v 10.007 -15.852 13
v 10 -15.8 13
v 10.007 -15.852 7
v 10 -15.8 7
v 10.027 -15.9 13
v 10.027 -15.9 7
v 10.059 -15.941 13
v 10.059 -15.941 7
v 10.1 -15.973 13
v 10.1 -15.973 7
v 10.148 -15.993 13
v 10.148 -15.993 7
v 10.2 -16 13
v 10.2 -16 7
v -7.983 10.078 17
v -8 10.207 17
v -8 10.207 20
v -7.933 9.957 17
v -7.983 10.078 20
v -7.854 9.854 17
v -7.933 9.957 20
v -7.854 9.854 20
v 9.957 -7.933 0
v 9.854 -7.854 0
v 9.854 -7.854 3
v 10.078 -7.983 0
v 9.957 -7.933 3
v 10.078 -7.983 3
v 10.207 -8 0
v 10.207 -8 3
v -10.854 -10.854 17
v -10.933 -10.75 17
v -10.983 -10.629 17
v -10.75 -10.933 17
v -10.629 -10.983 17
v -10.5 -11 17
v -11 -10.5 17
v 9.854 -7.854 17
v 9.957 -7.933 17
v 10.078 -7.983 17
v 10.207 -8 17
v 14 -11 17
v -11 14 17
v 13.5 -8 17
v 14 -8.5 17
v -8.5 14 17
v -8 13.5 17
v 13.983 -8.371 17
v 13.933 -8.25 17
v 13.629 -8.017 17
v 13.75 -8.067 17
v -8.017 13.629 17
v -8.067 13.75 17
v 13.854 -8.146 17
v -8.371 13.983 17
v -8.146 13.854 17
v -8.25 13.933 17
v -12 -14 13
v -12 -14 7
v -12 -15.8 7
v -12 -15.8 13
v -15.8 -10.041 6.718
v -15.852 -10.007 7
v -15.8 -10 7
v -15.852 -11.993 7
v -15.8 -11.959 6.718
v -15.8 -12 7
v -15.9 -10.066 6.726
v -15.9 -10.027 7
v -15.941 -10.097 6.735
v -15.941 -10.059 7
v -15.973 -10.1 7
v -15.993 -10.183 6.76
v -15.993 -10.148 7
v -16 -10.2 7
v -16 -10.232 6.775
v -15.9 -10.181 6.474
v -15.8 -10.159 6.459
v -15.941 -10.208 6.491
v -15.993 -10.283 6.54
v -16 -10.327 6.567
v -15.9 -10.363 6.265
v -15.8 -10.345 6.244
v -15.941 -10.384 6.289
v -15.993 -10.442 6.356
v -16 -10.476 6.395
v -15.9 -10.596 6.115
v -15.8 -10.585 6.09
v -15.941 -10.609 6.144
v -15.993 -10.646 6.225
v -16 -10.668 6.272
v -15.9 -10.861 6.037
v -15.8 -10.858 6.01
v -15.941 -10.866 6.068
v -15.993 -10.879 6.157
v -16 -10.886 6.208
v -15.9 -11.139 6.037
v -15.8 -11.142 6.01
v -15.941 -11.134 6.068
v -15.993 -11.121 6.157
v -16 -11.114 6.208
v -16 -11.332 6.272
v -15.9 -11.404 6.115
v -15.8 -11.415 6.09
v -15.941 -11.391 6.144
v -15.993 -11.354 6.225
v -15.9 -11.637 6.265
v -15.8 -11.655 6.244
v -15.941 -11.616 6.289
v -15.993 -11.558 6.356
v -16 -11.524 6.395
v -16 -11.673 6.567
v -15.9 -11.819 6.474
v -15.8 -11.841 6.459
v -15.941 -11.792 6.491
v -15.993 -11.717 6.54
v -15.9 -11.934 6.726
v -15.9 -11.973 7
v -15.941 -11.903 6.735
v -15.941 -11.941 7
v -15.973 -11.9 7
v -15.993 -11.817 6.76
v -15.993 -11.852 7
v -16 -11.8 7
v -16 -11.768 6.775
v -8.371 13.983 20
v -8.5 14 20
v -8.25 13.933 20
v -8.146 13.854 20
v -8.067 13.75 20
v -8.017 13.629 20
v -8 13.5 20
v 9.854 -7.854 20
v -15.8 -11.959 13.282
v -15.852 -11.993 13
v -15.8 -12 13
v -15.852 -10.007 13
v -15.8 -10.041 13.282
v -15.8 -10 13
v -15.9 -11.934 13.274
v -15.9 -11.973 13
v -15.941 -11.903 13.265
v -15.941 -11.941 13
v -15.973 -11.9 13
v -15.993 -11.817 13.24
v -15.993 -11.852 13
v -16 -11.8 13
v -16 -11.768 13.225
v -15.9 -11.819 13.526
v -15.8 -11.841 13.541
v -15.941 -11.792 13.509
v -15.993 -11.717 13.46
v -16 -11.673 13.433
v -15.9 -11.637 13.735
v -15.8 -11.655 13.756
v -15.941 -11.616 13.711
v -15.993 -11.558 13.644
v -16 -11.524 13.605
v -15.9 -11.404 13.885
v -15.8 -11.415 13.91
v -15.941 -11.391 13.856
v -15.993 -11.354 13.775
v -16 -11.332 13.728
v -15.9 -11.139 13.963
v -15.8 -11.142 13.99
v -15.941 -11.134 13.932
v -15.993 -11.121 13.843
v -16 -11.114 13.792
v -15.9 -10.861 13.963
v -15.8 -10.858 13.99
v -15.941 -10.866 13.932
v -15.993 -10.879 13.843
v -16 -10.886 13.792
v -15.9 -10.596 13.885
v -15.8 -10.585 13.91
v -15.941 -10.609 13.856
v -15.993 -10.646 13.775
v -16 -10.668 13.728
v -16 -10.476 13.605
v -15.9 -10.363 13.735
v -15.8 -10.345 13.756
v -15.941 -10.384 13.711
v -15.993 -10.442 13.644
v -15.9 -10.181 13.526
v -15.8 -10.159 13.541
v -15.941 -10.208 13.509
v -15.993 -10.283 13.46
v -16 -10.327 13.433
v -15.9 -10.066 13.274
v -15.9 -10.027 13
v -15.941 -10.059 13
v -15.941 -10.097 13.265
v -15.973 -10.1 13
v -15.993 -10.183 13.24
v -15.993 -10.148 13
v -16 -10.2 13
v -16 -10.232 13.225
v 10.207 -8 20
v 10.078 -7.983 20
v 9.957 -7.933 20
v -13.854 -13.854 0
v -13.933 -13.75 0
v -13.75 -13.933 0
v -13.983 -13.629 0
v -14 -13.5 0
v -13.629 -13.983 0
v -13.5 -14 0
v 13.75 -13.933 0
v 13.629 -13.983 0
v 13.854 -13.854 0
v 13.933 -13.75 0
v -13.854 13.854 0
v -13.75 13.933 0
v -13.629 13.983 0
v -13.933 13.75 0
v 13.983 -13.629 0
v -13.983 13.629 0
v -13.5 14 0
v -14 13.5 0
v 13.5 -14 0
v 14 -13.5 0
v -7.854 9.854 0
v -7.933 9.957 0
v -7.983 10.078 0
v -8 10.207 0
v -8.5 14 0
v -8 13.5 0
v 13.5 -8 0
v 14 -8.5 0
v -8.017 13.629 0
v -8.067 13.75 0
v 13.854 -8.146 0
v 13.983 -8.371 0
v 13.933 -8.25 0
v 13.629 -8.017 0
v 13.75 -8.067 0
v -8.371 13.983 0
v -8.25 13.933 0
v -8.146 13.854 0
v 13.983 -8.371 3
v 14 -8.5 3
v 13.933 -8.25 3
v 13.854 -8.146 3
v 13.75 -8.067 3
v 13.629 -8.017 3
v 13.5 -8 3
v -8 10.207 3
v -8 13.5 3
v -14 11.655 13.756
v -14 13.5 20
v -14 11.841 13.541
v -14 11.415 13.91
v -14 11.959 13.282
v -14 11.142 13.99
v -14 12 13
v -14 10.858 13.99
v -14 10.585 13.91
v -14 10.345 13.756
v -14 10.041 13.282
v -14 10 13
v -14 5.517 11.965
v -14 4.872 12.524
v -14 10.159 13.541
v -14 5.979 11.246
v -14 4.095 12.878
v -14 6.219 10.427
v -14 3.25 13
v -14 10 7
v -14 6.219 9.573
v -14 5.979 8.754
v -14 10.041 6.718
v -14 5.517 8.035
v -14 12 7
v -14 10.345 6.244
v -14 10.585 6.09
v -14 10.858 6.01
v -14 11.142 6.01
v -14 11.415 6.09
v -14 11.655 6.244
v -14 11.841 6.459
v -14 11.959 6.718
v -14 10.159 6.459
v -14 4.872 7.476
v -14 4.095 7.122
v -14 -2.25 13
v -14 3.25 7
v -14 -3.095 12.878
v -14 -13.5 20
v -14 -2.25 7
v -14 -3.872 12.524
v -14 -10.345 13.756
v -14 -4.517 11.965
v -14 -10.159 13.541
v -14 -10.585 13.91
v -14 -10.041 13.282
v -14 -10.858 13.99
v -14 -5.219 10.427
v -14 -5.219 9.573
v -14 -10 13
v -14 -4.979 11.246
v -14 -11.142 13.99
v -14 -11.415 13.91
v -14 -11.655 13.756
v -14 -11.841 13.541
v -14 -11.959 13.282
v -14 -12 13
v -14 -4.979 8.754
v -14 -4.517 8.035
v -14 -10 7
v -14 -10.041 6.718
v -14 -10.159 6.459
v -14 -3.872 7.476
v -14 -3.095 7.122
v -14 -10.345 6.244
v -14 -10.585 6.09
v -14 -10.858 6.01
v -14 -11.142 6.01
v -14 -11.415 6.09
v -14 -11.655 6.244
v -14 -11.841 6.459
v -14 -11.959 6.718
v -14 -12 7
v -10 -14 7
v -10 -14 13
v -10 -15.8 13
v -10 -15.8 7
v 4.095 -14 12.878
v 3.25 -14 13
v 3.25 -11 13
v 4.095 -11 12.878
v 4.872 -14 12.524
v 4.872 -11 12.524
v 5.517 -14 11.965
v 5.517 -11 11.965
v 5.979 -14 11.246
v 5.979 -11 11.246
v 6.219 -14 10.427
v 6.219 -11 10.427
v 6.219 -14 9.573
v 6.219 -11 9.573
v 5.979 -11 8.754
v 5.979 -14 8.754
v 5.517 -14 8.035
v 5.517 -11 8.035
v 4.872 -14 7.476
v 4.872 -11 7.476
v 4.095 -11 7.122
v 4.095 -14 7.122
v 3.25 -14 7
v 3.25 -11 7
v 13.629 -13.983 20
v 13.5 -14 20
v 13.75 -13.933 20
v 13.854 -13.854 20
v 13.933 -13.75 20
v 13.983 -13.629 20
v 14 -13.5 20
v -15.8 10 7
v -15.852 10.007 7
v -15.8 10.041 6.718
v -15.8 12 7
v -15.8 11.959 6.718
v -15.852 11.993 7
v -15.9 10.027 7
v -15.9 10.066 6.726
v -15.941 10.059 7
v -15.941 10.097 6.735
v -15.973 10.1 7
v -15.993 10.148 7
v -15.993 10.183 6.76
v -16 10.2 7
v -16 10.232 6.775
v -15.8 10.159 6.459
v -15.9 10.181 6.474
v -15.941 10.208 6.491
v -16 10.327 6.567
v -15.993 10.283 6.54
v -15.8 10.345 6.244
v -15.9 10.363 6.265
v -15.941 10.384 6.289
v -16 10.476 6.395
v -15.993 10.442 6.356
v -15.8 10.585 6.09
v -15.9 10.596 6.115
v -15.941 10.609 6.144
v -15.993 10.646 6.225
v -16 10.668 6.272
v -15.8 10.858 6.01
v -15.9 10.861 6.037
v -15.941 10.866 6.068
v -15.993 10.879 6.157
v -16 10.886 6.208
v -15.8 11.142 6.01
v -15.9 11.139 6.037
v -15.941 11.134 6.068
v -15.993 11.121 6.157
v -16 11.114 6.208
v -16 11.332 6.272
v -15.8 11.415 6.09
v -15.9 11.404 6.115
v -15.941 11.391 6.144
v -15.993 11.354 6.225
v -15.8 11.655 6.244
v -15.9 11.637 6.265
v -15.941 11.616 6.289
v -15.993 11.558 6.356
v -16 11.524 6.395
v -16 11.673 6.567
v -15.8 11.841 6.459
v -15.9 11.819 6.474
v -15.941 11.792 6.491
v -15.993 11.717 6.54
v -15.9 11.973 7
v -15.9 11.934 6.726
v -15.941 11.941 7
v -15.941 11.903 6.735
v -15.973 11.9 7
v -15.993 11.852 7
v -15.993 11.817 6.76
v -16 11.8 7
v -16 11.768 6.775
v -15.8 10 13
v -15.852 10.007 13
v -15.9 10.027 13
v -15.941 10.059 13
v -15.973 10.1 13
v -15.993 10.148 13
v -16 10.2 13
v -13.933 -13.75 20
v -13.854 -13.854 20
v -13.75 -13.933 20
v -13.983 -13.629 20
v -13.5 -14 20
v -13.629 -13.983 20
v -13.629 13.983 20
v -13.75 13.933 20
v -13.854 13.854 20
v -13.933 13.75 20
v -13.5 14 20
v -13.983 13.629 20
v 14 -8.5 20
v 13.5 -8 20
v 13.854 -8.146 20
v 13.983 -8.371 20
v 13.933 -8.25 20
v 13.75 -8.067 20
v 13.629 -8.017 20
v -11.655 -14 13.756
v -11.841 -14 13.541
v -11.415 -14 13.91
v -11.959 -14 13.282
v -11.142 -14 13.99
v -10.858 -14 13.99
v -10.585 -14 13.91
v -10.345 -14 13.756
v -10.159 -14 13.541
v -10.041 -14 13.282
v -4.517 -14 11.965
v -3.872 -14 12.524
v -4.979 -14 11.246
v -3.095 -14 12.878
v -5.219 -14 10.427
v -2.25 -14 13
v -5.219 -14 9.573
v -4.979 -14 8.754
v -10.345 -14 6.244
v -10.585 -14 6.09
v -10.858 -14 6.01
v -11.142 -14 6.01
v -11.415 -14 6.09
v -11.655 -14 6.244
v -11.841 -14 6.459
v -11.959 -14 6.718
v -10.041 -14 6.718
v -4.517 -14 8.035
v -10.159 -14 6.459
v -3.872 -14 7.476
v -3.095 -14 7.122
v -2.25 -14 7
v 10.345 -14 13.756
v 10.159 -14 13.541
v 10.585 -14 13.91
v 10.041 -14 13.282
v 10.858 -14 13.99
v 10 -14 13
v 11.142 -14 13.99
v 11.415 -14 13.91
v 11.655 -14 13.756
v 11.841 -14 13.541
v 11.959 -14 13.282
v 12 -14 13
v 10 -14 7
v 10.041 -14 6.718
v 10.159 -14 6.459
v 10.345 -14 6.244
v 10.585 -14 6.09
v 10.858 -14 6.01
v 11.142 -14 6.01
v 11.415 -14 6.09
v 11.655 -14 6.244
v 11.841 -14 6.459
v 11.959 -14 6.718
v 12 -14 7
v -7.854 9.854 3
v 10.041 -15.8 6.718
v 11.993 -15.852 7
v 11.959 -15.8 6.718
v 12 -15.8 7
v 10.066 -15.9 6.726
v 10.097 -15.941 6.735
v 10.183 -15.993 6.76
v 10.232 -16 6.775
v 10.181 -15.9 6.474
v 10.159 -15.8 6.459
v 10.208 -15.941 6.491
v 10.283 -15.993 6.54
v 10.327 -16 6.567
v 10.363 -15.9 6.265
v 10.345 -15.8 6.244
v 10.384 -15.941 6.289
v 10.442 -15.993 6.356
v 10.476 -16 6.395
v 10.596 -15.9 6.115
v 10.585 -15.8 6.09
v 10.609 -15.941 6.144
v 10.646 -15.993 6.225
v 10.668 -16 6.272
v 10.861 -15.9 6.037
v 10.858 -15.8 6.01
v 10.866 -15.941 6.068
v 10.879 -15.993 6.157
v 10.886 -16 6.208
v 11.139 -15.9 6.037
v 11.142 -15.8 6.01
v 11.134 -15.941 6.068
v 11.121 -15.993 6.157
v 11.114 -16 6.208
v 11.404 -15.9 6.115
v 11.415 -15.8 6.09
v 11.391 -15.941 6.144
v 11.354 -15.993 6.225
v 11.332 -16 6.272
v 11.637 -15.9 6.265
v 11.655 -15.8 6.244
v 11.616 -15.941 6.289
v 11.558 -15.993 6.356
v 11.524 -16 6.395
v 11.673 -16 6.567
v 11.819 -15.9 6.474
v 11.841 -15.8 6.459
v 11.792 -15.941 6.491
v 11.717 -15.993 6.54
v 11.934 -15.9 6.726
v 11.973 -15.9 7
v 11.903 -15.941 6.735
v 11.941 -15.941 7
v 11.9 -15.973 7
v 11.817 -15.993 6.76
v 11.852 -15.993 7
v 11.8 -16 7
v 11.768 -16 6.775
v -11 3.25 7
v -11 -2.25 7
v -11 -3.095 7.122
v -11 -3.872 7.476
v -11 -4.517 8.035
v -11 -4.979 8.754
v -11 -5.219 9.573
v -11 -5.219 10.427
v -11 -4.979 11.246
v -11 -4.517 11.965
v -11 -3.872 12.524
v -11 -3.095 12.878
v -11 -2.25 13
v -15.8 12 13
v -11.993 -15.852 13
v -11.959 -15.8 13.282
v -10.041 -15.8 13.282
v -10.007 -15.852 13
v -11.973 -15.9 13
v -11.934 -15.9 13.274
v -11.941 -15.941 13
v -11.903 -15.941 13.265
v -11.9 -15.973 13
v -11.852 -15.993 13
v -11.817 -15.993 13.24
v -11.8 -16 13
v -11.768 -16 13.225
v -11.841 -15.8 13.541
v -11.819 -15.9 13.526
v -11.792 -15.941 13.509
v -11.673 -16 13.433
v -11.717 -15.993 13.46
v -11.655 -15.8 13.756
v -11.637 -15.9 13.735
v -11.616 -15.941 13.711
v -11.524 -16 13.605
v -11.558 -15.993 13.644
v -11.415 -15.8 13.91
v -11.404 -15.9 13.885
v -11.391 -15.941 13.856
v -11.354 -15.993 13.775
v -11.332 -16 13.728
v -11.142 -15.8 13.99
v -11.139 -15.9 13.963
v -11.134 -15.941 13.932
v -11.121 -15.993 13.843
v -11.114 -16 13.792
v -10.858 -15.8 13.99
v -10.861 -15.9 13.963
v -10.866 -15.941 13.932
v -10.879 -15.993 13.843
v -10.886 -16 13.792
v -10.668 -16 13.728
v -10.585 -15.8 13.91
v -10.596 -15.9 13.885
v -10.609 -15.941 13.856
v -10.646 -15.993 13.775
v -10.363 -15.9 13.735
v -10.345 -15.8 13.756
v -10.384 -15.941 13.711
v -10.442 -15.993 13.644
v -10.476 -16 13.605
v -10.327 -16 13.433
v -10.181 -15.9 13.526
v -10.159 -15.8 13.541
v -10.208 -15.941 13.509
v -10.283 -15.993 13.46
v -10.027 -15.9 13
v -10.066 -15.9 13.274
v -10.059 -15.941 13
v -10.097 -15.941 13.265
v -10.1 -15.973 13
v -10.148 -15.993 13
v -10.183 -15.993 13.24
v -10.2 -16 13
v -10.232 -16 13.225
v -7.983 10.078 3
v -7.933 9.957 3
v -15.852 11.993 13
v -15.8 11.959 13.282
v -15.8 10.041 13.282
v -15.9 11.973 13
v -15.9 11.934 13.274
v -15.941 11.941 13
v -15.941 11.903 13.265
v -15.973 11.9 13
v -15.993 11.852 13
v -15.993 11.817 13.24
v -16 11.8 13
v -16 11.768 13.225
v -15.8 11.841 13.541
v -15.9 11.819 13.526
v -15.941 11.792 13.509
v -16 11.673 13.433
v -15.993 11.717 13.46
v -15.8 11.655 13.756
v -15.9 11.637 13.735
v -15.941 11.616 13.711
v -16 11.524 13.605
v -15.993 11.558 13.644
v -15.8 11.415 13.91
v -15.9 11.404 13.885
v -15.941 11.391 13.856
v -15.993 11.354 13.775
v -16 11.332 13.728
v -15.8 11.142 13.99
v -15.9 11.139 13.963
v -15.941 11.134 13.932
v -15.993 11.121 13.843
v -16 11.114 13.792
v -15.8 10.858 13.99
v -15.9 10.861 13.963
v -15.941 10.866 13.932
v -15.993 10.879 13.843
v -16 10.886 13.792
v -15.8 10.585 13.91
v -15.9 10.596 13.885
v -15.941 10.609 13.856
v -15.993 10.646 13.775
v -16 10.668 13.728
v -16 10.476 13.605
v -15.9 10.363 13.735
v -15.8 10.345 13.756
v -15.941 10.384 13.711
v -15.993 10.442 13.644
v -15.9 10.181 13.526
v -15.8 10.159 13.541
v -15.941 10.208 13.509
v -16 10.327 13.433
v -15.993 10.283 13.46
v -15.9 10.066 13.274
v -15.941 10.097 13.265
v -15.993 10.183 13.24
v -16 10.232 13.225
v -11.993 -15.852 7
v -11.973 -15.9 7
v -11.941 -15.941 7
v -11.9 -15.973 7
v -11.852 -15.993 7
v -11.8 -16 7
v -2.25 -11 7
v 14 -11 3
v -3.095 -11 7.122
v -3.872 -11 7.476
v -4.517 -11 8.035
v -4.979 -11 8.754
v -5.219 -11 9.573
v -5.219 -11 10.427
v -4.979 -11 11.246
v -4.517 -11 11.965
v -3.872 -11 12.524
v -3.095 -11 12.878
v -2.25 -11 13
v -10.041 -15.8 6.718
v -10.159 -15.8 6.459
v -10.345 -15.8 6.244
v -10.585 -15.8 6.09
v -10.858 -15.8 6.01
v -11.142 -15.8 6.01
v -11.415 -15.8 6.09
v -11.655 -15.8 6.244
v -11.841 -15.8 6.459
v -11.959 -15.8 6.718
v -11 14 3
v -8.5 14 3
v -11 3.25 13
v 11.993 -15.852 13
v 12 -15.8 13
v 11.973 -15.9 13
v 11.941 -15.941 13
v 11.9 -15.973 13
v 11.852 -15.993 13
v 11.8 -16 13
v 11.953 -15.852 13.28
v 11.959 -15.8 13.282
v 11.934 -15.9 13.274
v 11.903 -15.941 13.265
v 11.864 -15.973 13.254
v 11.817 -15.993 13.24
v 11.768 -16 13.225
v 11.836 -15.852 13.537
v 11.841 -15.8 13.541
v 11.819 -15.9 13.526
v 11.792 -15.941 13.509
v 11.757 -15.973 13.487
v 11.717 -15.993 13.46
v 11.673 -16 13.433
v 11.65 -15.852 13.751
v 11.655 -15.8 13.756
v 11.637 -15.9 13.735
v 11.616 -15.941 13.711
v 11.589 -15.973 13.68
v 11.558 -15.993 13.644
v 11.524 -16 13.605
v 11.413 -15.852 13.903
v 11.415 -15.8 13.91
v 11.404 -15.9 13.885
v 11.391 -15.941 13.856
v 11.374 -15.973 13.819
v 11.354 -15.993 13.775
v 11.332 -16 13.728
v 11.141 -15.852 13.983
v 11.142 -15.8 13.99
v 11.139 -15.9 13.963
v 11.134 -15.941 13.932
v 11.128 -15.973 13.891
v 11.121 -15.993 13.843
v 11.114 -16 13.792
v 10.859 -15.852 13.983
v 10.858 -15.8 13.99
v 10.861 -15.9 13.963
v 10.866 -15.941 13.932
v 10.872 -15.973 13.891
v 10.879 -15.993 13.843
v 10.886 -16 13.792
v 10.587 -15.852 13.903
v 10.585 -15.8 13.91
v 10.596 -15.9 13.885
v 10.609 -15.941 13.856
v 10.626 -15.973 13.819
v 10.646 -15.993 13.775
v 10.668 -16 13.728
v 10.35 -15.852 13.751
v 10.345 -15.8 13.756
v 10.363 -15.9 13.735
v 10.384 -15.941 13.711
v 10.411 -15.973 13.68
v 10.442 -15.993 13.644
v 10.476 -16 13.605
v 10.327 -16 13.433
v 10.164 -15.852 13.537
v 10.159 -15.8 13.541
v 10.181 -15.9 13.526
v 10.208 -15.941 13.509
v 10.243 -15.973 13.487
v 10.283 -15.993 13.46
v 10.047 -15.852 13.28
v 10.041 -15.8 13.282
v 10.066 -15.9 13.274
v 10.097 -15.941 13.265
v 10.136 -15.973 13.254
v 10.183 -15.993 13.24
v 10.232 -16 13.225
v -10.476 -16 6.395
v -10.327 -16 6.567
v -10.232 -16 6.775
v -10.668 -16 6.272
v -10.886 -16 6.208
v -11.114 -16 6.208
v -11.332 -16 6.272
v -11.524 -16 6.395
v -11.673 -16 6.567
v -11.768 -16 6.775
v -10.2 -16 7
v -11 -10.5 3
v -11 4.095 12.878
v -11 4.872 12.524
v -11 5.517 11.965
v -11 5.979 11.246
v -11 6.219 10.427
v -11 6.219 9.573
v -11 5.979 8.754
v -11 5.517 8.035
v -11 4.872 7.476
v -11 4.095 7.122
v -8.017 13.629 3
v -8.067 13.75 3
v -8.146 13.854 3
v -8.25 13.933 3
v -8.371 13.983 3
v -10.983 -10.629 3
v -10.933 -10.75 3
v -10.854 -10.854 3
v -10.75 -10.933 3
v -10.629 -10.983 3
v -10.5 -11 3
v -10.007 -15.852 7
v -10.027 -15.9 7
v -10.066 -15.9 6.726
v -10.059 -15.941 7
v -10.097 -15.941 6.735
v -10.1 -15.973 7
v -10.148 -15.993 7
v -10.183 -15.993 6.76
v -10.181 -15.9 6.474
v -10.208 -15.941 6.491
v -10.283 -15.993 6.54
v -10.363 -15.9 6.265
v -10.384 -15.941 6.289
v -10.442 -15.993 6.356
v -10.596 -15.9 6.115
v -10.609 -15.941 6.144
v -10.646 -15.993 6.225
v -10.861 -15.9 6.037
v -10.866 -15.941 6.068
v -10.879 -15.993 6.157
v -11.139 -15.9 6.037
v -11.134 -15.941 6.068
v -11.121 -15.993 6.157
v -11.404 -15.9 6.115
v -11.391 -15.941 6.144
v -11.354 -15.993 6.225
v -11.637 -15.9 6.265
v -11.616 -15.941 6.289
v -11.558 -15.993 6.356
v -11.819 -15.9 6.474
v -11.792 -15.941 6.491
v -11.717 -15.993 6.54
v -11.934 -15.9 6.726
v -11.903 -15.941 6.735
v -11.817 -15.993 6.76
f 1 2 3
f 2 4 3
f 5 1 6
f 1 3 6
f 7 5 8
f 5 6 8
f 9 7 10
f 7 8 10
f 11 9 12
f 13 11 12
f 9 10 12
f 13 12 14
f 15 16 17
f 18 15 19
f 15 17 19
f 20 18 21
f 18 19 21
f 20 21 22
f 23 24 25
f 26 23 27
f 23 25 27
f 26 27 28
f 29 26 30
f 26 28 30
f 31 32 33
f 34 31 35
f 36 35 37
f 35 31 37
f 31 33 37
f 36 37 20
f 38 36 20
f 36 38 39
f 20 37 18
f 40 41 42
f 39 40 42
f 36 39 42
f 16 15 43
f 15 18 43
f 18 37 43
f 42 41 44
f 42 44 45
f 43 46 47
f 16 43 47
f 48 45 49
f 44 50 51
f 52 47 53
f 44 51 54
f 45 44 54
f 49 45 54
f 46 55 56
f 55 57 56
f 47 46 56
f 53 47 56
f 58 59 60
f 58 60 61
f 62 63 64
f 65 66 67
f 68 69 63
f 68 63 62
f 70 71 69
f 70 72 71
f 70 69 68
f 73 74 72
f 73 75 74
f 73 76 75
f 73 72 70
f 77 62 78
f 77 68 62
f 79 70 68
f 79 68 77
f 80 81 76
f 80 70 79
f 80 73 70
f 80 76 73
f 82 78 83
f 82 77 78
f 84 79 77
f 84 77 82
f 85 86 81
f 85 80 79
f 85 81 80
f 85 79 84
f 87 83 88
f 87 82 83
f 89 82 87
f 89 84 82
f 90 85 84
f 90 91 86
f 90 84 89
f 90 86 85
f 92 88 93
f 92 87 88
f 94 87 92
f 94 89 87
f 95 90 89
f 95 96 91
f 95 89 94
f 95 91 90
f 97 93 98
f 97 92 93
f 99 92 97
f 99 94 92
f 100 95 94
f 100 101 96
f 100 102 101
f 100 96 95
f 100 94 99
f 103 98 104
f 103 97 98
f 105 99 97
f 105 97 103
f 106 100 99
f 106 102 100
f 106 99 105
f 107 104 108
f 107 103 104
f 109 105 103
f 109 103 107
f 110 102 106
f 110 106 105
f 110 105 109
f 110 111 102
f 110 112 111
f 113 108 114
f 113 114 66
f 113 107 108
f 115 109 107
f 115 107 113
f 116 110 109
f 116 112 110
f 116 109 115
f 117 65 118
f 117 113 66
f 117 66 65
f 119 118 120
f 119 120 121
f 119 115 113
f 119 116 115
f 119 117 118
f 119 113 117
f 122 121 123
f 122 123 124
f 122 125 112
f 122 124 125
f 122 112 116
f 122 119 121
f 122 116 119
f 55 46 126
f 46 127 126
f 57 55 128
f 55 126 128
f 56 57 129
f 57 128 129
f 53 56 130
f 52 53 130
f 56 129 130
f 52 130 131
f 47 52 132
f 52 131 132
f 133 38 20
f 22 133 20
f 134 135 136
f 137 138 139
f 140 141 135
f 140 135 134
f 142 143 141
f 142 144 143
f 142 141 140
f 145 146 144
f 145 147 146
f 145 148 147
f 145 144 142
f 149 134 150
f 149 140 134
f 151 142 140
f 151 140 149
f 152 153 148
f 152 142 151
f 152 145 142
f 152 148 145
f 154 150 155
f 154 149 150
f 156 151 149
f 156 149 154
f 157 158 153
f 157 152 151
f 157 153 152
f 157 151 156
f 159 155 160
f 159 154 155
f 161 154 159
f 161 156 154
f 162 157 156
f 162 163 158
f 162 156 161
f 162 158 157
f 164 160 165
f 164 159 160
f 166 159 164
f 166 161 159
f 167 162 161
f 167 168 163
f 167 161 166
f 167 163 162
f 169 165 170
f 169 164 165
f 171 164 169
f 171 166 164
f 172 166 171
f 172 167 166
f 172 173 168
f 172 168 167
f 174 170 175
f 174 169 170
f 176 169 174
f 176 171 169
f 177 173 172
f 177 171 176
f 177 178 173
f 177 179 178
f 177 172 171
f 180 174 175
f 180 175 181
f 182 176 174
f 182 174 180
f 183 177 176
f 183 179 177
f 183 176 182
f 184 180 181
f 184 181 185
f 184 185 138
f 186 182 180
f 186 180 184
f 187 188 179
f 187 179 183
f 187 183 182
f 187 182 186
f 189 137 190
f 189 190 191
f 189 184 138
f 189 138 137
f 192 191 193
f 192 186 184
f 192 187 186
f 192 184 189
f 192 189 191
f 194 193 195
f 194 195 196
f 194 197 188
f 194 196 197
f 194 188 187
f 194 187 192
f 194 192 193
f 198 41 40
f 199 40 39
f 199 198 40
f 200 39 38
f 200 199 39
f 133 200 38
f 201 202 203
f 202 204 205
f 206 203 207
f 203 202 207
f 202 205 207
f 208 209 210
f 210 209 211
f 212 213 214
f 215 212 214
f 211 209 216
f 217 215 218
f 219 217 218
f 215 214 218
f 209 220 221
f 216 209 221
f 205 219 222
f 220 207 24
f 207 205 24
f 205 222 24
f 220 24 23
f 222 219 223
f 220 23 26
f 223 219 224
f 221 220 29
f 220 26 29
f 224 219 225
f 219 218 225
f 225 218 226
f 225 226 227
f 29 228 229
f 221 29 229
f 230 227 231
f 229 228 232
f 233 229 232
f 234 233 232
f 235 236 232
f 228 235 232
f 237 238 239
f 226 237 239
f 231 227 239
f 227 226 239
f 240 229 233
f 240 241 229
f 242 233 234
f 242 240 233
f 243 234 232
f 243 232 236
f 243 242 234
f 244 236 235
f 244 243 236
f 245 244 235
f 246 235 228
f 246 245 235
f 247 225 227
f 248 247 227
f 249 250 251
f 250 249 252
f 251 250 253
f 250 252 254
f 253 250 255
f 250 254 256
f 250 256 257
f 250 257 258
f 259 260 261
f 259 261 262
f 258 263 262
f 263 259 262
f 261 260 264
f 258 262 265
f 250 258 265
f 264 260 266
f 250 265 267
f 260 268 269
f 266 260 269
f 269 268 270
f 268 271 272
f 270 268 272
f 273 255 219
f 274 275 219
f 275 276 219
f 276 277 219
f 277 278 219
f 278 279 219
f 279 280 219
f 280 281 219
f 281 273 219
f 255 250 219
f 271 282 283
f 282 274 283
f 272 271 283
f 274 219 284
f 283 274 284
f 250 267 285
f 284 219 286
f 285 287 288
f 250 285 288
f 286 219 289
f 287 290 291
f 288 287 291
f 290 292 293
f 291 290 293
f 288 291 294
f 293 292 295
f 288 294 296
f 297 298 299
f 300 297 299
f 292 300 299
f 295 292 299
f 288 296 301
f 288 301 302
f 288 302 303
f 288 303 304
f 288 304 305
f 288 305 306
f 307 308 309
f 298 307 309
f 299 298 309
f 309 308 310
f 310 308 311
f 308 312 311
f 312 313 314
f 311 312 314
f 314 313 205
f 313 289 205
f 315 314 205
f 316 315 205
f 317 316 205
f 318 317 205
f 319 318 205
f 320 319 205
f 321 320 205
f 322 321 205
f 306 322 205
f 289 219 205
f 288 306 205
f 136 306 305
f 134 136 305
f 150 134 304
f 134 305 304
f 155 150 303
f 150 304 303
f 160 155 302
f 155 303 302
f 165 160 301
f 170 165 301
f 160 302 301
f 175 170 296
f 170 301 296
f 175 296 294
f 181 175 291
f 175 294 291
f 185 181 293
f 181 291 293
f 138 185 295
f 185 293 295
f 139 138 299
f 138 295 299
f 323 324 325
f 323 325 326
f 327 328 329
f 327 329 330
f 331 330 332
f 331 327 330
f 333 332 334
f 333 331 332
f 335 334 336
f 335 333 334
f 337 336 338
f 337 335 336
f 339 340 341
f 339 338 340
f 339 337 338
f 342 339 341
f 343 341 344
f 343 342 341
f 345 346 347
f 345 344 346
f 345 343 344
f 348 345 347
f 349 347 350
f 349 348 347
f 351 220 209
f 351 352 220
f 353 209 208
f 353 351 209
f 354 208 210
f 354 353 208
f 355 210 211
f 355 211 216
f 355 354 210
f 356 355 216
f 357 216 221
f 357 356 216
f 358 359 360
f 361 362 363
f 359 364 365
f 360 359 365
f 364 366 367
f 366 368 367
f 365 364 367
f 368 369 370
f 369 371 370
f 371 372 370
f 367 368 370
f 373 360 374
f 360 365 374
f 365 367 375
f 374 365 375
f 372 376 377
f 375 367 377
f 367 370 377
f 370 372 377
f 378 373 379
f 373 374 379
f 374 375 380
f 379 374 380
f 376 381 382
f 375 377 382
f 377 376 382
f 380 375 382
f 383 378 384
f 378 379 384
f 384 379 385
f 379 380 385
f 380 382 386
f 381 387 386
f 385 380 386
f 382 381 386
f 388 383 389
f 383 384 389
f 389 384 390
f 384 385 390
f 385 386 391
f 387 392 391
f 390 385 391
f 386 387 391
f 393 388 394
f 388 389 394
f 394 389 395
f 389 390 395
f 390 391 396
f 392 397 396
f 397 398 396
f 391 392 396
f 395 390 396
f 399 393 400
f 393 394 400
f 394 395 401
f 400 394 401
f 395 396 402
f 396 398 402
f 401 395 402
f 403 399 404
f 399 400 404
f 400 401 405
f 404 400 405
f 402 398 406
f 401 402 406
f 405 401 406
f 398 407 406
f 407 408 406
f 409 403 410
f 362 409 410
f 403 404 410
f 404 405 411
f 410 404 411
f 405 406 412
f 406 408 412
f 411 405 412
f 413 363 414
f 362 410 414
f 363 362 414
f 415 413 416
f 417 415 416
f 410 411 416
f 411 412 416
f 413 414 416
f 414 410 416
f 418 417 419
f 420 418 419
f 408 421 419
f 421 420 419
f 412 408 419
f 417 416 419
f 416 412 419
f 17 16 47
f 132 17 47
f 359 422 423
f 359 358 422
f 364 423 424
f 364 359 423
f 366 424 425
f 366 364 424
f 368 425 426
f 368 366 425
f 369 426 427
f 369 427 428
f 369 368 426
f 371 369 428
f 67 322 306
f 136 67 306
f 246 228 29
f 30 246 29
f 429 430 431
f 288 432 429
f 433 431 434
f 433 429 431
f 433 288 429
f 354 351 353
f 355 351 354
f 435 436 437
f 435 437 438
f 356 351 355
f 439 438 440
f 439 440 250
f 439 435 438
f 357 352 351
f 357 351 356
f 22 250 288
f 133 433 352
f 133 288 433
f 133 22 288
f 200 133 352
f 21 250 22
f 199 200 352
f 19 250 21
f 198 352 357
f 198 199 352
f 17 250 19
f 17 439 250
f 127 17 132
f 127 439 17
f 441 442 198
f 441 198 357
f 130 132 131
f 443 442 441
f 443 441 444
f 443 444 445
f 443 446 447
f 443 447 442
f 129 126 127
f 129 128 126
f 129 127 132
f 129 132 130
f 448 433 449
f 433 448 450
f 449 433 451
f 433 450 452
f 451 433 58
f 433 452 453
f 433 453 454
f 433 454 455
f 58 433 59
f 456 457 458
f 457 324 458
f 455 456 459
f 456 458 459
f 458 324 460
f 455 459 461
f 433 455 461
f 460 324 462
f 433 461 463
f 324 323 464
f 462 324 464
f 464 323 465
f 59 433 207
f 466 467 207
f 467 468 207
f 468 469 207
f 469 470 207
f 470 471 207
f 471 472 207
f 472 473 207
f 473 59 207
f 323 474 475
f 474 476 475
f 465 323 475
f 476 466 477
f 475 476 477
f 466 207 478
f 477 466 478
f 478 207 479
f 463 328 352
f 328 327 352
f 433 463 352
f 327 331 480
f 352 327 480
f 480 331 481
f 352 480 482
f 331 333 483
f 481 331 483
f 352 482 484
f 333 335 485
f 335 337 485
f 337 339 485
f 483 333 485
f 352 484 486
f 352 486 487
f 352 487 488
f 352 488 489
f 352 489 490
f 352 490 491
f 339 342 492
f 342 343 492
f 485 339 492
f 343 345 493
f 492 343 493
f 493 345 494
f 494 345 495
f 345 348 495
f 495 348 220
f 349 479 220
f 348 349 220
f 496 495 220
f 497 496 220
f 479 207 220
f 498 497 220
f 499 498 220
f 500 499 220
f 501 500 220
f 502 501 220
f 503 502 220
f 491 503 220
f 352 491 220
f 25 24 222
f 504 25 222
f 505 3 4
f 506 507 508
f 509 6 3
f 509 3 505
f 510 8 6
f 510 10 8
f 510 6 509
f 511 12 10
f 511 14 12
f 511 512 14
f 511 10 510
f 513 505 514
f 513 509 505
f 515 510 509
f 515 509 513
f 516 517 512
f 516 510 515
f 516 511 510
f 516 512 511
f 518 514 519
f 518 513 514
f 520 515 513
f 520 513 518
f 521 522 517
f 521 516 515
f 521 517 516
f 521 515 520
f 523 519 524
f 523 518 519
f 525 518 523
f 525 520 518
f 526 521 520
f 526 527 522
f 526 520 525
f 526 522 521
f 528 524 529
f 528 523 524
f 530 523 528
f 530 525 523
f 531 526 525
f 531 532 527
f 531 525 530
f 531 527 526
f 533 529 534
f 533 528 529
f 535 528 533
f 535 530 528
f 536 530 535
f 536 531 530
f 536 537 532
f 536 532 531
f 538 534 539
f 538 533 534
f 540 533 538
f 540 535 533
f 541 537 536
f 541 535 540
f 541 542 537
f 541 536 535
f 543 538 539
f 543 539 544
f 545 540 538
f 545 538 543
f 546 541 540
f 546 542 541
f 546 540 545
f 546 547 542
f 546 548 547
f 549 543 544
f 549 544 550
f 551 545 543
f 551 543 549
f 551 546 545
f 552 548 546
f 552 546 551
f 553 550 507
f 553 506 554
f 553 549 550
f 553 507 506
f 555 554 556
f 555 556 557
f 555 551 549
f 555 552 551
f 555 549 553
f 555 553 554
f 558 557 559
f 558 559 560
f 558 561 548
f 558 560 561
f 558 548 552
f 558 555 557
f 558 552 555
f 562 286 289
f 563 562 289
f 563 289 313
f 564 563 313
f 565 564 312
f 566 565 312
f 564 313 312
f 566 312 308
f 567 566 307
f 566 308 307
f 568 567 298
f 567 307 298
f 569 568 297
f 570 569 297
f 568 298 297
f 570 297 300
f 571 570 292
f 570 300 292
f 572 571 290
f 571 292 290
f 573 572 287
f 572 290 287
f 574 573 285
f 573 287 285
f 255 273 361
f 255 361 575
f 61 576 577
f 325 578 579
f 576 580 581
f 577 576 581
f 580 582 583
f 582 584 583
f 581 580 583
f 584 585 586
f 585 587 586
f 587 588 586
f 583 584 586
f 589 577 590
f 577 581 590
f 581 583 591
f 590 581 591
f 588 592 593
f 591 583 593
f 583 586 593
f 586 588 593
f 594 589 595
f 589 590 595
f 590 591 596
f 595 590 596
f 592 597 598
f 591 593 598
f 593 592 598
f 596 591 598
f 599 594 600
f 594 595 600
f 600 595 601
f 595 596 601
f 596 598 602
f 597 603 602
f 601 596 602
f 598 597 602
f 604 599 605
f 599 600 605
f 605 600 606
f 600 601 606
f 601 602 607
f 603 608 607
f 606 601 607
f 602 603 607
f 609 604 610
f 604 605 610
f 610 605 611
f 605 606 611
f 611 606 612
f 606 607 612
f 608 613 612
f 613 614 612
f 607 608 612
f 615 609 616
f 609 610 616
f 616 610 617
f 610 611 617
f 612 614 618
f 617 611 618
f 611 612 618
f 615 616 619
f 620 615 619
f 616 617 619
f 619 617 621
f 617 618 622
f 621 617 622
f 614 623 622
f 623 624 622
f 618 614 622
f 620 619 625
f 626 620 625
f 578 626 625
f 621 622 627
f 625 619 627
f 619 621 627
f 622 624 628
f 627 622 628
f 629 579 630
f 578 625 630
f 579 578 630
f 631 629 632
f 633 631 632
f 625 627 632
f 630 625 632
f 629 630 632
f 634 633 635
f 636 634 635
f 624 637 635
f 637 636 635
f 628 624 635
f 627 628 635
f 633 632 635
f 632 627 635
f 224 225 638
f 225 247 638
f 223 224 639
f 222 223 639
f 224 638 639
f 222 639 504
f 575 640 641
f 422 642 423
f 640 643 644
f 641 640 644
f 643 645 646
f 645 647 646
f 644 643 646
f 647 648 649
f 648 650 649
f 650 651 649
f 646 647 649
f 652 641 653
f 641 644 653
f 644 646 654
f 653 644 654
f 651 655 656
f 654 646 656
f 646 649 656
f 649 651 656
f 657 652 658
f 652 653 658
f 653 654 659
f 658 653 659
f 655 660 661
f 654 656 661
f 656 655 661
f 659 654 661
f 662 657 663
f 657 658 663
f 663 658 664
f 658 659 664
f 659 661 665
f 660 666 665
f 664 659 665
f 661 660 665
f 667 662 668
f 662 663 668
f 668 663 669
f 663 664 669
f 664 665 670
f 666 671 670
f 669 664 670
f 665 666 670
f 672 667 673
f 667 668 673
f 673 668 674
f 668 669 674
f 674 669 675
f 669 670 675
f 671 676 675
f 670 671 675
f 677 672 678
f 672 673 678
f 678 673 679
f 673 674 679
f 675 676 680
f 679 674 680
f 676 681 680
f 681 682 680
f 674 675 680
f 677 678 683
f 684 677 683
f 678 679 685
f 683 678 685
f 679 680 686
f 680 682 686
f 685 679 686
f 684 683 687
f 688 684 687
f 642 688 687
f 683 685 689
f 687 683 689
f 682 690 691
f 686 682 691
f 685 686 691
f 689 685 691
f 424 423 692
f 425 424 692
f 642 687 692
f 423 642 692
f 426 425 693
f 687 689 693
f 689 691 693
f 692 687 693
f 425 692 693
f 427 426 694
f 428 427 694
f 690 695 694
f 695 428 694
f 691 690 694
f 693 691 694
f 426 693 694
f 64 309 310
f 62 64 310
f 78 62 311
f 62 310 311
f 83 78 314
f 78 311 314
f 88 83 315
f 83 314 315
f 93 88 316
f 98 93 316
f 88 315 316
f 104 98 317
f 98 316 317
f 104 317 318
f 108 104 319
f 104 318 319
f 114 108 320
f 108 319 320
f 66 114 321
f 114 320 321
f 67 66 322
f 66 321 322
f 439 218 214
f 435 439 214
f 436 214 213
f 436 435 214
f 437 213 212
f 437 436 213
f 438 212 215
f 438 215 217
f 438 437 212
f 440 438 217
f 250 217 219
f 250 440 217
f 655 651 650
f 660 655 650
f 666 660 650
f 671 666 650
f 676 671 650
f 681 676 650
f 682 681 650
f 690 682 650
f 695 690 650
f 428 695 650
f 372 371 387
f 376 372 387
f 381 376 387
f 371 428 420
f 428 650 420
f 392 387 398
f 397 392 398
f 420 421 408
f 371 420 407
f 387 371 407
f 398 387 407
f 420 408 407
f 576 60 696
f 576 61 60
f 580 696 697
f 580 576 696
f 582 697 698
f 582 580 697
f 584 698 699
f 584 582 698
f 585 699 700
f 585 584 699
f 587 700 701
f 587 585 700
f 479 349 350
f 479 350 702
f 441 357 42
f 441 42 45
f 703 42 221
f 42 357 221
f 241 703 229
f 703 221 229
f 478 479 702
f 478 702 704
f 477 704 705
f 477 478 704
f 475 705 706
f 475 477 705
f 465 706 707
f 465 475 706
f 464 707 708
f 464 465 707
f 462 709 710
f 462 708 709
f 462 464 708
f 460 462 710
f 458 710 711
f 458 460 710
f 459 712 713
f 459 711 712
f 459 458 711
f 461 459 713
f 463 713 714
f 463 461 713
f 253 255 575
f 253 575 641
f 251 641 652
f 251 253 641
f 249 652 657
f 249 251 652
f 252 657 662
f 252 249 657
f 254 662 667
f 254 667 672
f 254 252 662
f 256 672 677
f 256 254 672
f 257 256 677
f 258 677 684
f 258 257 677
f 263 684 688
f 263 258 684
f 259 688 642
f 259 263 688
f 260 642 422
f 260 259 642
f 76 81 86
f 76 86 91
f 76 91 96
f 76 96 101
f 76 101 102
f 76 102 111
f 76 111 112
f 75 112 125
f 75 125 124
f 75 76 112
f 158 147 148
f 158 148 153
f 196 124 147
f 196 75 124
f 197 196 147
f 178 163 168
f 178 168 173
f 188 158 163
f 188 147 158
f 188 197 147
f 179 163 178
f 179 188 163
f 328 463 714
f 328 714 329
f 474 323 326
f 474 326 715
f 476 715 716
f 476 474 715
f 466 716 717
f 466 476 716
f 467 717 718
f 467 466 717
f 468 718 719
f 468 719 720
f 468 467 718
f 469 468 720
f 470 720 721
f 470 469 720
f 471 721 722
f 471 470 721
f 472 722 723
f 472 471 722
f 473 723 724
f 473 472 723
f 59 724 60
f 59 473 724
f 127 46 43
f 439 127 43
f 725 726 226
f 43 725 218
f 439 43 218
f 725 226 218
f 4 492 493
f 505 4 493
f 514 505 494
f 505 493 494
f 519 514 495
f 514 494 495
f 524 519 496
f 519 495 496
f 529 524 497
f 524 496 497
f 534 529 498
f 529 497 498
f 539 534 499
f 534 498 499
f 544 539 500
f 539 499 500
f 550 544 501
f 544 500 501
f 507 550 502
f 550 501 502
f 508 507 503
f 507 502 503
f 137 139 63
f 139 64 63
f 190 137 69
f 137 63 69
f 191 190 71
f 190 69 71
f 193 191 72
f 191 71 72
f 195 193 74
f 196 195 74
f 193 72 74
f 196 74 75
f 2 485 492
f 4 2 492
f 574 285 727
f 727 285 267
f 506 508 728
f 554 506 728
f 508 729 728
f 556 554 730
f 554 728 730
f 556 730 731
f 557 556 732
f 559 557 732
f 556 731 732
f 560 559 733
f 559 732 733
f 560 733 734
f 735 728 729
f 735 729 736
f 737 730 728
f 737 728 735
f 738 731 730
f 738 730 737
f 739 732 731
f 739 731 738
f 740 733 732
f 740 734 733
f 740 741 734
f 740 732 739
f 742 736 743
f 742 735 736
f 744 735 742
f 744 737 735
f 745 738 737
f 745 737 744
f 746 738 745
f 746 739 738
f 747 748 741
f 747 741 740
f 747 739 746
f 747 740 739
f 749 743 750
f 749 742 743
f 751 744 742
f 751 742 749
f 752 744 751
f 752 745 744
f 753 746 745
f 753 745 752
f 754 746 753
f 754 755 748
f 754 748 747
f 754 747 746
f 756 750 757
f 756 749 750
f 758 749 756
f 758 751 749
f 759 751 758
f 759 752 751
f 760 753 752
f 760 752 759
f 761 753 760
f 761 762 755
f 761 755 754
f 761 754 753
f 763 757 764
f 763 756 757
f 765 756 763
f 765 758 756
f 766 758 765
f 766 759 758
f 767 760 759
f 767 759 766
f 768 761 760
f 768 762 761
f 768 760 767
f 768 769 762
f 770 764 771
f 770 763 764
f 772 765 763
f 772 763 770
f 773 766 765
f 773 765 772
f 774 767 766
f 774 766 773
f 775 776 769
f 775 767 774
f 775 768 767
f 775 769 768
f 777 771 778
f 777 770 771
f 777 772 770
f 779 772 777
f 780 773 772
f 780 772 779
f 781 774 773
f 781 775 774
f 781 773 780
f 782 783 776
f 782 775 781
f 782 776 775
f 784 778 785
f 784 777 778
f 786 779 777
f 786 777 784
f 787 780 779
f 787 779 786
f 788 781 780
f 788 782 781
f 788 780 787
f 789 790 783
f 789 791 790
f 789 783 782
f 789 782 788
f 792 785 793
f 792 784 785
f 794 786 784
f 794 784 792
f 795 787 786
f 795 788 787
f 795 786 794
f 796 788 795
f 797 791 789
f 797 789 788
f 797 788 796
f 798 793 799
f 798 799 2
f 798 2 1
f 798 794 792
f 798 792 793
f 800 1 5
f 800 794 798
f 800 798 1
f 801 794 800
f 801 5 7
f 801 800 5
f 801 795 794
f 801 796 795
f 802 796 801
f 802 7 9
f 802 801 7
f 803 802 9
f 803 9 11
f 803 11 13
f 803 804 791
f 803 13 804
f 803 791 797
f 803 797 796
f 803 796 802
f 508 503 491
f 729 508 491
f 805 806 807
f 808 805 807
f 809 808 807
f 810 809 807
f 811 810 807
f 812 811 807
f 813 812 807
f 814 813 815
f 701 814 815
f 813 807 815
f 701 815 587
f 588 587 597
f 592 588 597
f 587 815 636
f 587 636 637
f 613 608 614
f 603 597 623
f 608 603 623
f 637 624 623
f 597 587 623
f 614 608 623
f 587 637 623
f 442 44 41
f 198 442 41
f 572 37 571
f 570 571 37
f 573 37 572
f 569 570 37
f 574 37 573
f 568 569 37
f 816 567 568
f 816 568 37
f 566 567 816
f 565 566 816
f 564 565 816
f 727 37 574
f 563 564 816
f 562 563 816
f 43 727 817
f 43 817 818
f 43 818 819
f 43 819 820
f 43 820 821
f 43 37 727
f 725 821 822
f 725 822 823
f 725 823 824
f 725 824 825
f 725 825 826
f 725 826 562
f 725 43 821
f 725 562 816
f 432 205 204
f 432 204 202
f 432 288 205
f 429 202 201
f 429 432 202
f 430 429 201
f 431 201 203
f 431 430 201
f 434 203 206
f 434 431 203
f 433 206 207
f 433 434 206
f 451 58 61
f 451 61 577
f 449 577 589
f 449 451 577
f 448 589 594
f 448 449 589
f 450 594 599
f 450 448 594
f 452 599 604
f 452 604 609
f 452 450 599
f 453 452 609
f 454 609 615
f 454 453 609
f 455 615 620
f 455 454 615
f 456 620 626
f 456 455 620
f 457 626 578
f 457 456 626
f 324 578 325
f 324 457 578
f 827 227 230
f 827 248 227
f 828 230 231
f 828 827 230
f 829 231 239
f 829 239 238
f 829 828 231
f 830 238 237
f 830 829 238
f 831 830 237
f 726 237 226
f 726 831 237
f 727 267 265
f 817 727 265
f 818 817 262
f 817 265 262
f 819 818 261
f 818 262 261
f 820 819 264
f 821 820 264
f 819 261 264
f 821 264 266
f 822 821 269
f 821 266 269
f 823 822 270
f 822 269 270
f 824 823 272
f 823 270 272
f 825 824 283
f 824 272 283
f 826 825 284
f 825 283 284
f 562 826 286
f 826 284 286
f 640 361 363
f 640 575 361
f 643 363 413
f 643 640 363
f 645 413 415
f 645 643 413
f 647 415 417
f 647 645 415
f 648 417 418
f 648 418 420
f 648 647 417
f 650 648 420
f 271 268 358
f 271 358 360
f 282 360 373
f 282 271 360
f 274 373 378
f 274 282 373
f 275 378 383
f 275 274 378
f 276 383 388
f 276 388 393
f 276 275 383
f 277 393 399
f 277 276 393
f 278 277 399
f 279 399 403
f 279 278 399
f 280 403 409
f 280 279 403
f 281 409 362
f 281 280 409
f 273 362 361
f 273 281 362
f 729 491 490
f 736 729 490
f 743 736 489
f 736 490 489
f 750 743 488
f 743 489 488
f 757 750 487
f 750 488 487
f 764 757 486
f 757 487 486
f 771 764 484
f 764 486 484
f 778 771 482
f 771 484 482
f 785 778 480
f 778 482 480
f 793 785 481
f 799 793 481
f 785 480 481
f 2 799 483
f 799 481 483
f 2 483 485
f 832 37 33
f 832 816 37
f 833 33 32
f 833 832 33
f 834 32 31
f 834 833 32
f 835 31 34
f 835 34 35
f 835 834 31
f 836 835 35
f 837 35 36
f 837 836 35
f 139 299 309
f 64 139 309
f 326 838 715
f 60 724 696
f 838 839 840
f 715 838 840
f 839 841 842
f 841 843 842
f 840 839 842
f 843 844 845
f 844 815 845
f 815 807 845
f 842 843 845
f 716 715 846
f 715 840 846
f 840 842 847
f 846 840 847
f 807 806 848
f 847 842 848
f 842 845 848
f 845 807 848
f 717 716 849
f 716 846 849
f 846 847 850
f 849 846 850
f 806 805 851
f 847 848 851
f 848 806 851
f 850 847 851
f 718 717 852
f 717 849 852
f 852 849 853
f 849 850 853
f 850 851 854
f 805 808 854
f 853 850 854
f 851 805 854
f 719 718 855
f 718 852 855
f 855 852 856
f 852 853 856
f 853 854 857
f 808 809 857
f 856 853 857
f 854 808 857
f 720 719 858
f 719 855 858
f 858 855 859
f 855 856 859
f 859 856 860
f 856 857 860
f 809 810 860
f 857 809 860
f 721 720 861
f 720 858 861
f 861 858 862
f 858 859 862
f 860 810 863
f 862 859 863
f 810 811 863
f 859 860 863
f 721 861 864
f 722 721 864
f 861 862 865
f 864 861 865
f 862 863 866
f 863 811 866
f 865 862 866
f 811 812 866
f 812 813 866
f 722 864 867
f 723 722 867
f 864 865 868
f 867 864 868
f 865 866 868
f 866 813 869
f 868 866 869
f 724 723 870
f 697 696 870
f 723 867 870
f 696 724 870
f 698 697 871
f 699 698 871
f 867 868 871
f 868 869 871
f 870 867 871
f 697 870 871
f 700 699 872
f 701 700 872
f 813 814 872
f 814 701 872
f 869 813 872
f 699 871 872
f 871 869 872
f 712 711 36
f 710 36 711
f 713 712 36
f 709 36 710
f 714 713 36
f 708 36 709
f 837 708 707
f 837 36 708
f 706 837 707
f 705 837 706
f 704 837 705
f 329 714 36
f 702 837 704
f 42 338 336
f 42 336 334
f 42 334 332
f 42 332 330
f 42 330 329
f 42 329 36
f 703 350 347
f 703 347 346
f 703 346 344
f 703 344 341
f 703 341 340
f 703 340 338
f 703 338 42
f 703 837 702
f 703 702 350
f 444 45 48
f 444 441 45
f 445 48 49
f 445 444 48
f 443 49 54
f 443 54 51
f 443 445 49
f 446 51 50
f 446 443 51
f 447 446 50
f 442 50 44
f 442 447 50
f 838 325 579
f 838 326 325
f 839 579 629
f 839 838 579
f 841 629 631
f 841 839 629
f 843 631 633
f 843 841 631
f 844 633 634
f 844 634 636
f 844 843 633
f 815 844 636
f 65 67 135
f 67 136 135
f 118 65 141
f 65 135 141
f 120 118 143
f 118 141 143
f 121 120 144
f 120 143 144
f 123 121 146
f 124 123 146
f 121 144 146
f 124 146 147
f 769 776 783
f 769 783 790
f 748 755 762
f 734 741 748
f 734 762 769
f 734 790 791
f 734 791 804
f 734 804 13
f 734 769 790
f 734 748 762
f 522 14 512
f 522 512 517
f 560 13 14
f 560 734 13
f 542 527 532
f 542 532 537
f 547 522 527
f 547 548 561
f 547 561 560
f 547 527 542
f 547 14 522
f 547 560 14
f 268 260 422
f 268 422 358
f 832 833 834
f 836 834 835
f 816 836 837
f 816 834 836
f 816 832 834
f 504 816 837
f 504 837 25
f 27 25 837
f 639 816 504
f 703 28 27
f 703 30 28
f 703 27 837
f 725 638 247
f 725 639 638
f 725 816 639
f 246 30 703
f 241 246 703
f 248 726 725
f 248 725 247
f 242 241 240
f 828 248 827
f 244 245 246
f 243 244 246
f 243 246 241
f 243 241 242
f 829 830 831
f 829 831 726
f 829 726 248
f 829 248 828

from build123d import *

# Parameters (mm, degrees)
BOSS_EXTRUDE1_DEPTH = 20
SKETCH2_W           = 25
SKETCH2_H           = 14
CUT_EXTRUDE1_DEPTH  = 25
CUT_EXTRUDE2_DEPTH  = 29
BOSS_EXTRUDE2_DEPTH = 2
FILLET4_R           = 0.5
FILLET5_R           = 0.2


with BuildPart() as part:
    # Sketch1 → Boss-Extrude1 (new body)
    with BuildSketch(Plane.XY):
        Polygon((-8, 10), (-8, 14), (-14, 14), (-14, -14), (14, -14), (14, -8), (10, -8), align=None)
    extrude(amount=BOSS_EXTRUDE1_DEPTH)

    # Sketch2 → Cut-Extrude1 (cut)
    with BuildSketch(Plane(origin=(0, 14, 0), x_dir=(1, 0, 0), z_dir=(0, 1, 0))):
        with Locations((1.5, -10)):
            Rectangle(SKETCH2_W, SKETCH2_H)
    extrude(amount=-CUT_EXTRUDE1_DEPTH, mode=Mode.SUBTRACT)

    # Sketch3 → Cut-Extrude2 (cut, through all)
    with BuildSketch(Plane.XZ.offset(14)):
        with BuildLine():
            Line((-2.25, 13), (3.25, 13))
            ThreePointArc((3.25, 13), (6.25, 10), (3.25, 7))
            Line((3.25, 7), (-2.25, 7))
            ThreePointArc((-2.25, 7), (-5.25, 10), (-2.25, 13))
        make_face()
    cut_extrude2 = extrude(amount=-CUT_EXTRUDE2_DEPTH, mode=Mode.SUBTRACT)

    # Mirror1: Cut-Extrude2 across plane
    add(cut_extrude2.mirror(Plane(origin=(0, 0, 0), x_dir=(0, 0, 1), z_dir=(-0.707106781, 0.707106781, 0))), mode=Mode.SUBTRACT)

    # Sketch4 → Boss-Extrude2 (add)
    with BuildSketch(Plane.ZY.offset(14)):
        with BuildLine():
            Line((7, 12), (13, 12))
            ThreePointArc((13, 12), (14, 11), (13, 10))
            Line((13, 10), (7, 10))
            ThreePointArc((7, 10), (6, 11), (7, 12))
        make_face()
        with BuildLine():
            Line((7, -12), (13, -12))
            ThreePointArc((13, -12), (14, -11), (13, -10))
            Line((13, -10), (7, -10))
            ThreePointArc((7, -10), (6, -11), (7, -12))
        make_face()
    boss_extrude2 = extrude(amount=BOSS_EXTRUDE2_DEPTH)

    # Mirror4: Boss-Extrude2 across plane
    add(boss_extrude2.mirror(Plane(origin=(0, 0, 0), x_dir=(0, 0, 1), z_dir=(-0.707106781, 0.707106781, 0))))

    # Fillet4
    fillet4_edges = [part.edges().sort_by_distance(p)[0] for p in [
        (14, -8, 18.5),
        (14, -14, 10),
        (-14, -14, 10),
        (-14, 14, 10),
        (-8, 14, 18.5),
        (-8, 10, 18.5),
        (10, -8, 18.5),
        (14, -8, 1.5),
        (-8, 14, 1.5),
        (-8, 10, 1.5),
        (10, -8, 1.5),
        (-11, -11, 10),
    ]]
    fillet(fillet4_edges, radius=FILLET4_R)

    # Fillet5
    fillet5_edges = [part.edges().sort_by_distance(p)[0] for p in [
        (-16, -11, 6),
        (-16, -12, 10),
        (-16, -11, 14),
        (-16, -10, 10),
        (11, -16, 6),
        (12, -16, 10),
        (11, -16, 14),
        (10, -16, 10),
        (-11, -16, 6),
        (-10, -16, 10),
        (-11, -16, 14),
        (-12, -16, 10),
        (-16, 11, 6),
        (-16, 10, 10),
        (-16, 11, 14),
        (-16, 12, 10),
    ]]
    fillet(fillet5_edges, radius=FILLET5_R)


solid = part.part
